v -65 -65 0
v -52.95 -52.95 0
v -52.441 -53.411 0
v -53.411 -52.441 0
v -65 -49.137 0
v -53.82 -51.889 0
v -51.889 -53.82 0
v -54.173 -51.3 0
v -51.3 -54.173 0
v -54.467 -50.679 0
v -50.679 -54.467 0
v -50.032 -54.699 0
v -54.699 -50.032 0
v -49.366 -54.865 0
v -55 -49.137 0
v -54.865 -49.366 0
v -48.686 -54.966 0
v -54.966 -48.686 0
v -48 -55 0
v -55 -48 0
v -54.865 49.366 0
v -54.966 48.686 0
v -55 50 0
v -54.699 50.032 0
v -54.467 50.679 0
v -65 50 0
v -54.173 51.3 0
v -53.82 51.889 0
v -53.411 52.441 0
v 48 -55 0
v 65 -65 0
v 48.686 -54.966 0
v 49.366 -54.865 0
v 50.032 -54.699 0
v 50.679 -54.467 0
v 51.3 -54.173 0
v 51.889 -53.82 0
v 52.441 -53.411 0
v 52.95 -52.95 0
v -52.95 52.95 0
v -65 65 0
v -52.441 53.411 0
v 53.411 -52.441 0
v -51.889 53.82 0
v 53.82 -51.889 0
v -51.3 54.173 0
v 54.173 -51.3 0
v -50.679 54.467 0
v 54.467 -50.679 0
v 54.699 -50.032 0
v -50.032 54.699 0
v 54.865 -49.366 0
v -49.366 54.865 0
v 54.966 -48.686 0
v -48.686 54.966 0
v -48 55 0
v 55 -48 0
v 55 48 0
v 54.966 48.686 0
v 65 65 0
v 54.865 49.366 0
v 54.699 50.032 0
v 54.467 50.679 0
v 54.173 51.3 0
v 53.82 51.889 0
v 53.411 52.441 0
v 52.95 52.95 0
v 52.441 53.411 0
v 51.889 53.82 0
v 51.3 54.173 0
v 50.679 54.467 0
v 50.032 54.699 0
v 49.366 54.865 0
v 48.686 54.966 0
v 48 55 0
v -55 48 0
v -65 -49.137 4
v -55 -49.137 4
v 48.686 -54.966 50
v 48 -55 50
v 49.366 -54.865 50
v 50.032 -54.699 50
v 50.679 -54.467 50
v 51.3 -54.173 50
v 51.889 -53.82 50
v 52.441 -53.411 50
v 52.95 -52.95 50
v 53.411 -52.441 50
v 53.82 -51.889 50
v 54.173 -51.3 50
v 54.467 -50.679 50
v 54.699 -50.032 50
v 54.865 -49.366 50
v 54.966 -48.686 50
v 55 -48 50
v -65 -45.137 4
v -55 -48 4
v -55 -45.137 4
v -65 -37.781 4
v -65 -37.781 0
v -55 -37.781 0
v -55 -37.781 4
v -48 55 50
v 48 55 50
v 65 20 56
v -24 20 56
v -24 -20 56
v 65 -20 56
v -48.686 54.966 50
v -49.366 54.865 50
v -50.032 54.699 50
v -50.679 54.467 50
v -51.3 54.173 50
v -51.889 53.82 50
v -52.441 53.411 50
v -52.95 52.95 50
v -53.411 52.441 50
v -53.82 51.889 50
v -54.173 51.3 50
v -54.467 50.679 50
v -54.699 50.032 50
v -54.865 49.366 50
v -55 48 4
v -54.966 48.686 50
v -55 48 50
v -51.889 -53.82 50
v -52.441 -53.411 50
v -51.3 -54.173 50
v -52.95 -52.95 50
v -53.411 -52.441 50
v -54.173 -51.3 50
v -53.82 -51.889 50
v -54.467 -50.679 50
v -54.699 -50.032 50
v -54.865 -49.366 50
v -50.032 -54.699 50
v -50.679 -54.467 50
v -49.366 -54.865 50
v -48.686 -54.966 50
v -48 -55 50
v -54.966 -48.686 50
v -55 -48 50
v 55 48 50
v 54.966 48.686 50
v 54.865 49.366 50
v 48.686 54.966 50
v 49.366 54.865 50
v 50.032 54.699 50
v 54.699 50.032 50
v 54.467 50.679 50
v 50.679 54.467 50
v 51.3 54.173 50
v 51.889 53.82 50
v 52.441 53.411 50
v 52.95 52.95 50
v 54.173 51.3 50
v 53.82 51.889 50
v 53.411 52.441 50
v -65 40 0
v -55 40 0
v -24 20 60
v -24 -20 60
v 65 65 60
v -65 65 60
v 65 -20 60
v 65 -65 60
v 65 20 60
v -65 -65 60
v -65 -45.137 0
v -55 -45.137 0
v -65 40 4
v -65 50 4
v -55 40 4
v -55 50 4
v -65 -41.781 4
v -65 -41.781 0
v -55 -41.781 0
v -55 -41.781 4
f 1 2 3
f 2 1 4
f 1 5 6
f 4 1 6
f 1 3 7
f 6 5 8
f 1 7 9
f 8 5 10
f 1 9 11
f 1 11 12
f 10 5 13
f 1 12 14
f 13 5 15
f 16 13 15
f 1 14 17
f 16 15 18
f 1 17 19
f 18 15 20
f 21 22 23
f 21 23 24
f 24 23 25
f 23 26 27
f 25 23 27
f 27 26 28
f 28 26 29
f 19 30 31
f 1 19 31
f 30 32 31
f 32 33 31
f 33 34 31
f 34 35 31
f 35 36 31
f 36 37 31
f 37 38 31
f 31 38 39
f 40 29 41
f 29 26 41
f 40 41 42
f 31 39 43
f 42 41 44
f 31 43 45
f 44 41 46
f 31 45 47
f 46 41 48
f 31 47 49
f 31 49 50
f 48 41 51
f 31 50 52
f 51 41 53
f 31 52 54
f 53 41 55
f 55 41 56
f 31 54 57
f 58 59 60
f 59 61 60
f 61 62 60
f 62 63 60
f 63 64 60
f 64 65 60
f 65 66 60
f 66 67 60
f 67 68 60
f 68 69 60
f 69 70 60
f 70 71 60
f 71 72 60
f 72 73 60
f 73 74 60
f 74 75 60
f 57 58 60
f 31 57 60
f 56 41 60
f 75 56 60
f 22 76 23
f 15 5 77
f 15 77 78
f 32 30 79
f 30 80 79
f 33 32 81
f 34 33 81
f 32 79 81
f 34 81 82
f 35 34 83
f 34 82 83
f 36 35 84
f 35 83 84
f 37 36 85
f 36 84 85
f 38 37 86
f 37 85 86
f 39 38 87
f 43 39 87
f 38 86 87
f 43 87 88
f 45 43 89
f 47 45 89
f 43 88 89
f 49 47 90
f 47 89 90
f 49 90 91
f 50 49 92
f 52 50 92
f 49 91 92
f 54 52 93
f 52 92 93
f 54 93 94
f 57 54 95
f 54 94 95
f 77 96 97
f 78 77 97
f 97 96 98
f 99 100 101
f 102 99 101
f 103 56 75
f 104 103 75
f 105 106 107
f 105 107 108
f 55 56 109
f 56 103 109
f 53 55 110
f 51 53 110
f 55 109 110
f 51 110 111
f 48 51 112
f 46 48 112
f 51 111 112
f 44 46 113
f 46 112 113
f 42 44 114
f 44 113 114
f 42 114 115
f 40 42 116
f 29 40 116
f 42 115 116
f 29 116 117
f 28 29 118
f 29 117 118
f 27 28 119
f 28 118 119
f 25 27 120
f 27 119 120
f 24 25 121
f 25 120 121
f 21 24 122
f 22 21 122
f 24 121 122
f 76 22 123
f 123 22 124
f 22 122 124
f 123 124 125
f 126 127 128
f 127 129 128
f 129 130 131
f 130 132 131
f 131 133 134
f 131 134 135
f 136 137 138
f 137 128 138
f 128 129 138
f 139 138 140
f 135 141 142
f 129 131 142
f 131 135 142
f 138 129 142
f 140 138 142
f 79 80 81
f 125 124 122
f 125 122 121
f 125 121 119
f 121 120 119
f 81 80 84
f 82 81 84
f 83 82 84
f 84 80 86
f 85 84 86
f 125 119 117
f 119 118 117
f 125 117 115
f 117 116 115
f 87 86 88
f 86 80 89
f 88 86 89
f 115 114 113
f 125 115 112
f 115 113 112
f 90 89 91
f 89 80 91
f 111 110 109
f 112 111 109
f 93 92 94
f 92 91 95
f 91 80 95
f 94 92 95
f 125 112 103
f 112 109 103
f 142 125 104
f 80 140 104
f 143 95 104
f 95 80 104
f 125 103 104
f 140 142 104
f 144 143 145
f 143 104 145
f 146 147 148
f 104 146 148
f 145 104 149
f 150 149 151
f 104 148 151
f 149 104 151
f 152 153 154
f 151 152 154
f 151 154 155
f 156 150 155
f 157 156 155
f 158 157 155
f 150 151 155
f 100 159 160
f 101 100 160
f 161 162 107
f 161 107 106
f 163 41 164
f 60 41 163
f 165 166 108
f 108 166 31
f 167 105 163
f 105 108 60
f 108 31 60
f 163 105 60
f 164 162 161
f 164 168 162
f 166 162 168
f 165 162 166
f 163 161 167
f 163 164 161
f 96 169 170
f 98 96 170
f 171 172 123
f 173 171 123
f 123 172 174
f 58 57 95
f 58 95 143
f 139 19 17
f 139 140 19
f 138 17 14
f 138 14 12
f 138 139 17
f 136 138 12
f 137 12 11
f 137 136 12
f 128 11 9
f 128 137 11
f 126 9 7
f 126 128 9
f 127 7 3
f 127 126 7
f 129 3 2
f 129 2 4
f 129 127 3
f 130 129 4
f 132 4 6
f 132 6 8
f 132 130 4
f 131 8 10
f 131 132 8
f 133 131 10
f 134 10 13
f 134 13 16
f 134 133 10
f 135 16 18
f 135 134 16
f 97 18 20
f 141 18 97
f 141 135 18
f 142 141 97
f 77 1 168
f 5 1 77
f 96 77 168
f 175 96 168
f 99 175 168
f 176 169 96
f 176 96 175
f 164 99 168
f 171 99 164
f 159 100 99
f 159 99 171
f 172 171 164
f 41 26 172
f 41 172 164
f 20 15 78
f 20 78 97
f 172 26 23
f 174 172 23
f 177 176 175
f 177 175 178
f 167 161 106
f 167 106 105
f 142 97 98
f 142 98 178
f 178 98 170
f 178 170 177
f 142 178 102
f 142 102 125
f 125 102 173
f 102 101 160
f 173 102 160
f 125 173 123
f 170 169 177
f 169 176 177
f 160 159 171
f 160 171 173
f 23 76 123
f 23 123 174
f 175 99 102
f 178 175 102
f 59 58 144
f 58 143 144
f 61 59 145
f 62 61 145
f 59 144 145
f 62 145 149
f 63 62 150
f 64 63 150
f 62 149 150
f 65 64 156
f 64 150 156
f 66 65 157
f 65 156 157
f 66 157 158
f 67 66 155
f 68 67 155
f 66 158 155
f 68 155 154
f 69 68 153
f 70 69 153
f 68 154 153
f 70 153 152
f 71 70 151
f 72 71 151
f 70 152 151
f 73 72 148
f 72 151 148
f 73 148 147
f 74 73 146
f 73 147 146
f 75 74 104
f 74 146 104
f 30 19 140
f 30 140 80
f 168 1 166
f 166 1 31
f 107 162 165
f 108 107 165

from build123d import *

# Parameters (mm, degrees)
F0_W      = 130
F0_H      = 130
F1_DEPTH  = 60
F2_W      = 110
F2_H      = 110
F3_DEPTH  = 50
F4_W      = 89
F4_H      = 40
F5_DEPTH  = 4
F6_R      = 7
F7_W      = 10
F7_H      = 4
F8_DEPTH  = 4
F9_W      = 10
F9_H      = 4
F10_DEPTH = 4
F11_W     = 10
F11_H     = 10
F12_DEPTH = 4


with BuildPart() as f1:
    # F0 (on Top) → F1 (new body)
    with BuildSketch(Plane.XY):
        Rectangle(F0_W, F0_H)
    extrude(amount=F1_DEPTH)

    # F2 (on Top) → F3 (cut)
    with BuildSketch(Plane.XY):
        Rectangle(F2_W, F2_H)
    extrude(amount=F3_DEPTH, mode=Mode.SUBTRACT)

    # F4 (on face) → F5 (cut)
    with BuildSketch(Plane.XY.offset(60)):
        with Locations((20.5, 0)):
            Rectangle(F4_W, F4_H)
    extrude(amount=-F5_DEPTH, mode=Mode.SUBTRACT)

    # F6
    f6_edges = [f1.edges().sort_by_distance(p)[0] for p in [
        (55, -55, 25),
        (55, 55, 25),
        (-55, 55, 25),
        (-55, -55, 25),
    ]]
    fillet(f6_edges, radius=F6_R)

    # F7 (on face) → F8 (cut)
    with BuildSketch(Plane.XY):
        with Locations((-60, -39.780788)):
            Rectangle(F7_W, F7_H)
    extrude(amount=F8_DEPTH, mode=Mode.SUBTRACT)

    # F9 (on face) → F10 (cut)
    with BuildSketch(Plane.XY):
        with Locations((-60, -47.136784)):
            Rectangle(F9_W, F9_H)
    extrude(amount=F10_DEPTH, mode=Mode.SUBTRACT)

    # F11 (on face) → F12 (cut)
    with BuildSketch(Plane.XY):
        with Locations((-60, 45)):
            Rectangle(F11_W, F11_H)
    extrude(amount=F12_DEPTH, mode=Mode.SUBTRACT)


solid = f1.part
